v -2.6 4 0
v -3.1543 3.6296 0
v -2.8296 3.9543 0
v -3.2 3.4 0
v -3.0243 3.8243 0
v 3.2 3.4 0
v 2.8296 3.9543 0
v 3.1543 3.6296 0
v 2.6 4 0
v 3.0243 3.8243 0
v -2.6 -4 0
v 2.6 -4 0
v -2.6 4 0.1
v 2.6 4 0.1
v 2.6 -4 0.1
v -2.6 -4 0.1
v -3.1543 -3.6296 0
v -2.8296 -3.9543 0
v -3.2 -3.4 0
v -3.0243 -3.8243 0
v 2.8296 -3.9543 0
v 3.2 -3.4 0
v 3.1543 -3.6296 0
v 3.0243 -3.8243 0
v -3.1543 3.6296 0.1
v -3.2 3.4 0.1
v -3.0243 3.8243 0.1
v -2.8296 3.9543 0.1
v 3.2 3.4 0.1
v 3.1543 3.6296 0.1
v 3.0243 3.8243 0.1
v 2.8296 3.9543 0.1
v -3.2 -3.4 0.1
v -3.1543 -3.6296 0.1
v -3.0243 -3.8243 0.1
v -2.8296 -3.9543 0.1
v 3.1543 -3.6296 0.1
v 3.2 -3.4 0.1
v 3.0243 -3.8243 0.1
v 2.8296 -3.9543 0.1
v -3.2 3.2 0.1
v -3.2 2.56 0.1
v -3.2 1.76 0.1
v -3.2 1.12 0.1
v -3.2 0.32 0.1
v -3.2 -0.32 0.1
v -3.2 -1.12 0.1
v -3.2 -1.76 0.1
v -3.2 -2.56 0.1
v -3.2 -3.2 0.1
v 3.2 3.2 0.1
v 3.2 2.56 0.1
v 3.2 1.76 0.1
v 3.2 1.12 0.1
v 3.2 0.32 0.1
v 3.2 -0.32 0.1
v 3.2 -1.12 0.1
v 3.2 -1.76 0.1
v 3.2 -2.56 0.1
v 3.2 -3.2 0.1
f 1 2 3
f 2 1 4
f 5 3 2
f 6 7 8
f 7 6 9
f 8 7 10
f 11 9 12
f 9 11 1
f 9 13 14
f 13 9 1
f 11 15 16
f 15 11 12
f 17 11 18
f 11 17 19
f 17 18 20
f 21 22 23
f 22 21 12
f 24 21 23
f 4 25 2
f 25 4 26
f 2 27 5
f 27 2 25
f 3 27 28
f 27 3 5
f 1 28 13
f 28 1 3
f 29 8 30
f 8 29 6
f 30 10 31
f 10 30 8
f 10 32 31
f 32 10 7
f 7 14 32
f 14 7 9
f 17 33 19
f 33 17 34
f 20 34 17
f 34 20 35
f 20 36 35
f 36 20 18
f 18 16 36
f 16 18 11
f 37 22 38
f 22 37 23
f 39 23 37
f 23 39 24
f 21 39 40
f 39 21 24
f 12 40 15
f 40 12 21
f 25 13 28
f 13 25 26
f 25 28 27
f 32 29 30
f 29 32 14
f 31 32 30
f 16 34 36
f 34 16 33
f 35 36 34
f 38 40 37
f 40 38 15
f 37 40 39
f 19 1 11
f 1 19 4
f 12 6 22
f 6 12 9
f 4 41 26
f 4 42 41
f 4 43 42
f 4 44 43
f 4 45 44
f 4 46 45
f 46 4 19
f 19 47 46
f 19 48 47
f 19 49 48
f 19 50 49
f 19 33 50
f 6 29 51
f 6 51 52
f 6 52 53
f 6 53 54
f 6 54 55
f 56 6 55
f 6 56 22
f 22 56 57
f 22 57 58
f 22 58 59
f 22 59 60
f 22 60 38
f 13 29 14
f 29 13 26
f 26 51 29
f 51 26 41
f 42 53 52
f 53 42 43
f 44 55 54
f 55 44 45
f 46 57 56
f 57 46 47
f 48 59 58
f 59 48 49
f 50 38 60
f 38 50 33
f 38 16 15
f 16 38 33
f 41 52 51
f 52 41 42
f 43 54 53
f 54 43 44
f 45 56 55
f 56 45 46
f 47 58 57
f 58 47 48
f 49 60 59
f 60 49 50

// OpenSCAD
// file: ../p/box3u12.scad
use <../lib.scad>
function ldraw_lib__box3u12() = [
// 0 Box with 3 Parallel Faces without Any Edges
// 0 Name: box3u12.dat
// 0 Author: J.C. Tchang [tchang]
// 0 !LDRAW_ORG Primitive UPDATE 2014-02
// 0 !LICENSE Licensed under CC BY 4.0 : see CAreadme.txt
// 
// 0 BFC CERTIFY CCW
  [0,"BFC","CERTIFY"],
  [0,"BFC","CCW"],
// 
// 0 !HISTORY 2014-12-23 [PTadmin] Official Update 2014-02
// 
// 
// 4 16 -1 1 1 1 1 1 1 1 -1 -1 1 -1
  [4,16,-1,1,1,1,1,1,1,1,-1,-1,1,-1],
// 4 16 -1 1 1 -1 0 1 1 0 1 1 1 1
  [4,16,-1,1,1,-1,0,1,1,0,1,1,1,1],
// 4 16 1 1 -1 1 0 -1 -1 0 -1 -1 1 -1
  [4,16,1,1,-1,1,0,-1,-1,0,-1,-1,1,-1],
];
module ldraw_lib__box3u12(step=0, col=false, unit=2/5, alt=false, line=0.2, solid=!$preview)
    makepoly(ldraw_lib__box3u12(), step=step, col=col, unit=unit, alt=alt, line=line, solid=solid);
ldraw_lib__box3u12(line=0.2);
// file: ../p/1-4cyli.scad
use <../lib.scad>
function ldraw_lib__1_4cyli() = [
// 0 Cylinder 0.25
// 0 Name: 1-4cyli.dat
// 0 Author: James Jessiman
// 0 !LDRAW_ORG Primitive UPDATE 2012-01
// 0 !LICENSE Licensed under CC BY 4.0 : see CAreadme.txt
// 
// 0 BFC CERTIFY CCW
  [0,"BFC","CERTIFY"],
  [0,"BFC","CCW"],
// 
// 0 !HISTORY 2002-03-23 [sbliss] Added BFC statement.
// 0 !HISTORY 2002-04-25 [PTadmin] Official Update 2002-02
// 0 !HISTORY 2007-06-22 [PTadmin] Header formatted for Contributor Agreement
// 0 !HISTORY 2008-07-01 [PTadmin] Official Update 2008-01
// 0 !HISTORY 2012-02-16 [Philo] Changed to CCW
// 0 !HISTORY 2012-03-30 [PTadmin] Official Update 2012-01
// 
// 
// 4 16 1 1 0 0.9239 1 0.3827 0.9239 0 0.3827 1 0 0
  [4,16,1,1,0,0.9239,1,0.3827,0.9239,0,0.3827,1,0,0],
// 5 24 1 0 0 1 1 0 0.9239 0 0.3827 1 0 -1
  [5,24,1,0,0,1,1,0,0.9239,0,0.3827,1,0,-1],
// 4 16 0.9239 1 0.3827 0.7071 1 0.7071 0.7071 0 0.7071 0.9239 0 0.3827
  [4,16,0.9239,1,0.3827,0.7071,1,0.7071,0.7071,0,0.7071,0.9239,0,0.3827],
// 5 24 0.9239 0 0.3827 0.9239 1 0.3827 0.7071 0 0.7071 1 0 0
  [5,24,0.9239,0,0.3827,0.9239,1,0.3827,0.7071,0,0.7071,1,0,0],
// 4 16 0.7071 1 0.7071 0.3827 1 0.9239 0.3827 0 0.9239 0.7071 0 0.7071
  [4,16,0.7071,1,0.7071,0.3827,1,0.9239,0.3827,0,0.9239,0.7071,0,0.7071],
// 5 24 0.7071 0 0.7071 0.7071 1 0.7071 0.3827 0 0.9239 0.9239 0 0.3827
  [5,24,0.7071,0,0.7071,0.7071,1,0.7071,0.3827,0,0.9239,0.9239,0,0.3827],
// 4 16 0.3827 1 0.9239 0 1 1 0 0 1 0.3827 0 0.9239
  [4,16,0.3827,1,0.9239,0,1,1,0,0,1,0.3827,0,0.9239],
// 5 24 0.3827 0 0.9239 0.3827 1 0.9239 0 0 1 0.7071 0 0.7071
  [5,24,0.3827,0,0.9239,0.3827,1,0.9239,0,0,1,0.7071,0,0.7071],
// 5 24 0 0 1 0 1 1 0.3827 0 0.9239 -1 0 1
  [5,24,0,0,1,0,1,1,0.3827,0,0.9239,-1,0,1],
];
module ldraw_lib__1_4cyli(step=0, col=false, unit=2/5, alt=false, line=0.2, solid=!$preview)
    makepoly(ldraw_lib__1_4cyli(), step=step, col=col, unit=unit, alt=alt, line=line, solid=solid);
ldraw_lib__1_4cyli(line=0.2);
// file: ../p/1-4chrd.scad
use <../lib.scad>
function ldraw_lib__1_4chrd() = [
// 0 Chord 0.25
// 0 Name: 1-4chrd.dat
// 0 Author: Max Martin Richter [MMR1988]
// 0 !LDRAW_ORG Primitive UPDATE 2023-05
// 0 !LICENSE Licensed under CC BY 4.0 : see CAreadme.txt
// 
// 0 BFC CERTIFY CCW
  [0,"BFC","CERTIFY"],
  [0,"BFC","CCW"],
// 
// 0 !HISTORY 2004-04-22 [PTadmin] Official Update 2004-02
// 0 !HISTORY 2007-10-09 [PTadmin] Header formatted for Contributor Agreement
// 0 !HISTORY 2008-07-01 [PTadmin] Official Update 2008-01
// 0 !HISTORY 2012-08-02 [MMR1988] Re-creation with PrimGen2 and Rectifier
// 0 !HISTORY 2012-08-09 [PTadmin] Official Update 2012-02
// 0 !HISTORY 2023-10-27 [OrionP] Change author to MMR1988 from hafhead
// 0 !HISTORY 2023-10-31 [OrionP] Official Update 2023-05
// 
// 4 16 0.9239 0 0.3827 0.3827 0 0.9239 0 0 1 1 0 0
  [4,16,0.9239,0,0.3827,0.3827,0,0.9239,0,0,1,1,0,0],
// 3 16 0.7071 0 0.7071 0.3827 0 0.9239 0.9239 0 0.3827
  [3,16,0.7071,0,0.7071,0.3827,0,0.9239,0.9239,0,0.3827],
];
module ldraw_lib__1_4chrd(step=0, col=false, unit=2/5, alt=false, line=0.2, solid=!$preview)
    makepoly(ldraw_lib__1_4chrd(), step=step, col=col, unit=unit, alt=alt, line=line, solid=solid);
ldraw_lib__1_4chrd(line=0.2);
// main file
use <../lib.scad>
use <../p/1-4chrd.scad>
use <../p/1-4cyli.scad>
use <../p/box3u12.scad>
function ldraw_lib__6148328bl() = [
// 0 Sticker  1.0 x  0.8 with Dark Grey Stripes on Black Background
// 0 Name: 6148328bl.dat
// 0 Author: Massimo Maso [Sirio]
// 0 !LDRAW_ORG Part UPDATE 2024-08
// 0 !LICENSE Licensed under CC BY 4.0 : see CAreadme.txt
// 
// 0 BFC CERTIFY CCW
  [0,"BFC","CERTIFY"],
  [0,"BFC","CCW"],
// 
// 0 !KEYWORDS 919, Bricklink 75876stk01, Brickowl 852010, Hybrid, Pit Lane
// 0 !KEYWORDS Porsche, Rebrickable 26357, set 75876, Speed Champions
// 
// 0 !HISTORY 2024-09-30 [OrionP] Official Update 2024-08
// 
// 
// 0 // Primitives
// 
// 1 16 -6.5 0 8.5 -1.5 0 0 0 -1 0 0 0 1.5 1-4chrd.dat
  [1,16,-6.5,0,8.5,-1.5,0,0,0,-1,0,0,0,1.5, ldraw_lib__1_4chrd()],
// 1 16 6.5 0 8.5 1.5 0 0 0 -1 0 0 0 1.5 1-4chrd.dat
  [1,16,6.5,0,8.5,1.5,0,0,0,-1,0,0,0,1.5, ldraw_lib__1_4chrd()],
// 1 16 0 -.25 0 6.5 0 0 0 .25 0 0 0 10 box3u12.dat
  [1,16,0,-.25,0,6.5,0,0,0,.25,0,0,0,10, ldraw_lib__box3u12()],
// 1 16 -6.5 0 -8.5 -1.5 0 0 0 -1 0 0 0 -1.5 1-4chrd.dat
  [1,16,-6.5,0,-8.5,-1.5,0,0,0,-1,0,0,0,-1.5, ldraw_lib__1_4chrd()],
// 1 16 6.5 0 -8.5 1.5 0 0 0 -1 0 0 0 -1.5 1-4chrd.dat
  [1,16,6.5,0,-8.5,1.5,0,0,0,-1,0,0,0,-1.5, ldraw_lib__1_4chrd()],
// 1 16 -6.5 0 8.5 -1.5 0 0 0 -.25 0 0 0 1.5 1-4cyli.dat
  [1,16,-6.5,0,8.5,-1.5,0,0,0,-.25,0,0,0,1.5, ldraw_lib__1_4cyli()],
// 1 16 6.5 0 8.5 1.5 0 0 0 -.25 0 0 0 1.5 1-4cyli.dat
  [1,16,6.5,0,8.5,1.5,0,0,0,-.25,0,0,0,1.5, ldraw_lib__1_4cyli()],
// 1 16 -6.5 0 -8.5 -1.5 0 0 0 -.25 0 0 0 -1.5 1-4cyli.dat
  [1,16,-6.5,0,-8.5,-1.5,0,0,0,-.25,0,0,0,-1.5, ldraw_lib__1_4cyli()],
// 1 16 6.5 0 -8.5 1.5 0 0 0 -.25 0 0 0 -1.5 1-4cyli.dat
  [1,16,6.5,0,-8.5,1.5,0,0,0,-.25,0,0,0,-1.5, ldraw_lib__1_4cyli()],
// 1 0 -6.5 -.25 8.5 -1.5 0 0 0 1 0 0 0 1.5 1-4chrd.dat
  [1,0,-6.5,-.25,8.5,-1.5,0,0,0,1,0,0,0,1.5, ldraw_lib__1_4chrd()],
// 1 0 6.5 -.25 8.5 1.5 0 0 0 1 0 0 0 1.5 1-4chrd.dat
  [1,0,6.5,-.25,8.5,1.5,0,0,0,1,0,0,0,1.5, ldraw_lib__1_4chrd()],
// 1 0 -6.5 -.25 -8.5 -1.5 0 0 0 1 0 0 0 -1.5 1-4chrd.dat
  [1,0,-6.5,-.25,-8.5,-1.5,0,0,0,1,0,0,0,-1.5, ldraw_lib__1_4chrd()],
// 1 0 6.5 -.25 -8.5 1.5 0 0 0 1 0 0 0 -1.5 1-4chrd.dat
  [1,0,6.5,-.25,-8.5,1.5,0,0,0,1,0,0,0,-1.5, ldraw_lib__1_4chrd()],
// 0 // Bottom faces
// 4 16 -6.5 0 10 -6.5 0 -10 -8 0 -8.5 -8 0 8.5
  [4,16,-6.5,0,10,-6.5,0,-10,-8,0,-8.5,-8,0,8.5],
// 4 16 6.5 0 10 8 0 8.5 8 0 -8.5 6.5 0 -10
  [4,16,6.5,0,10,8,0,8.5,8,0,-8.5,6.5,0,-10],
// 0 // Lateral faces
// 3 16 -8 0 8.5 -8 -.25 8 -8 -.25 8.5
  [3,16,-8,0,8.5,-8,-.25,8,-8,-.25,8.5],
// 3 16 -8 0 8.5 -8 -.25 6.4 -8 -.25 8
  [3,16,-8,0,8.5,-8,-.25,6.4,-8,-.25,8],
// 3 16 -8 0 8.5 -8 -.25 4.4 -8 -.25 6.4
  [3,16,-8,0,8.5,-8,-.25,4.4,-8,-.25,6.4],
// 3 16 -8 0 8.5 -8 -.25 2.8 -8 -.25 4.4
  [3,16,-8,0,8.5,-8,-.25,2.8,-8,-.25,4.4],
// 3 16 -8 0 8.5 -8 -.25 .8 -8 -.25 2.8
  [3,16,-8,0,8.5,-8,-.25,.8,-8,-.25,2.8],
// 4 16 -8 0 8.5 -8 0 -8.5 -8 -.25 -.8 -8 -.25 .8
  [4,16,-8,0,8.5,-8,0,-8.5,-8,-.25,-.8,-8,-.25,.8],
// 3 16 -8 0 -8.5 -8 -.25 -2.8 -8 -.25 -.8
  [3,16,-8,0,-8.5,-8,-.25,-2.8,-8,-.25,-.8],
// 3 16 -8 0 -8.5 -8 -.25 -4.4 -8 -.25 -2.8
  [3,16,-8,0,-8.5,-8,-.25,-4.4,-8,-.25,-2.8],
// 3 16 -8 0 -8.5 -8 -.25 -6.4 -8 -.25 -4.4
  [3,16,-8,0,-8.5,-8,-.25,-6.4,-8,-.25,-4.4],
// 3 16 -8 0 -8.5 -8 -.25 -8 -8 -.25 -6.4
  [3,16,-8,0,-8.5,-8,-.25,-8,-8,-.25,-6.4],
// 3 16 -8 0 -8.5 -8 -.25 -8.5 -8 -.25 -8
  [3,16,-8,0,-8.5,-8,-.25,-8.5,-8,-.25,-8],
// 3 16 8 0 8.5 8 -.25 8.5 8 -.25 8
  [3,16,8,0,8.5,8,-.25,8.5,8,-.25,8],
// 3 16 8 0 8.5 8 -.25 8 8 -.25 6.4
  [3,16,8,0,8.5,8,-.25,8,8,-.25,6.4],
// 3 16 8 0 8.5 8 -.25 6.4 8 -.25 4.4
  [3,16,8,0,8.5,8,-.25,6.4,8,-.25,4.4],
// 3 16 8 0 8.5 8 -.25 4.4 8 -.25 2.8
  [3,16,8,0,8.5,8,-.25,4.4,8,-.25,2.8],
// 3 16 8 0 8.5 8 -.25 2.8 8 -.25 .8
  [3,16,8,0,8.5,8,-.25,2.8,8,-.25,.8],
// 4 16 8 0 -8.5 8 0 8.5 8 -.25 .8 8 -.25 -.8
  [4,16,8,0,-8.5,8,0,8.5,8,-.25,.8,8,-.25,-.8],
// 3 16 8 0 -8.5 8 -.25 -.8 8 -.25 -2.8
  [3,16,8,0,-8.5,8,-.25,-.8,8,-.25,-2.8],
// 3 16 8 0 -8.5 8 -.25 -2.8 8 -.25 -4.4
  [3,16,8,0,-8.5,8,-.25,-2.8,8,-.25,-4.4],
// 3 16 8 0 -8.5 8 -.25 -4.4 8 -.25 -6.4
  [3,16,8,0,-8.5,8,-.25,-4.4,8,-.25,-6.4],
// 3 16 8 0 -8.5 8 -.25 -6.4 8 -.25 -8
  [3,16,8,0,-8.5,8,-.25,-6.4,8,-.25,-8],
// 3 16 8 0 -8.5 8 -.25 -8 8 -.25 -8.5
  [3,16,8,0,-8.5,8,-.25,-8,8,-.25,-8.5],
// 0 // Top faces
// 0 // Black faces
// 4 0 -6.5 -.25 10 -8 -.25 8.5 8 -.25 8.5 6.5 -.25 10
  [4,0,-6.5,-.25,10,-8,-.25,8.5,8,-.25,8.5,6.5,-.25,10],
// 4 0 -8 -.25 8.5 -8 -.25 8 8 -.25 8 8 -.25 8.5
  [4,0,-8,-.25,8.5,-8,-.25,8,8,-.25,8,8,-.25,8.5],
// 4 0 -8 -.25 6.4 -8 -.25 4.4 8 -.25 4.4 8 -.25 6.4
  [4,0,-8,-.25,6.4,-8,-.25,4.4,8,-.25,4.4,8,-.25,6.4],
// 4 0 -8 -.25 2.8 -8 -.25 .8 8 -.25 .8 8 -.25 2.8
  [4,0,-8,-.25,2.8,-8,-.25,.8,8,-.25,.8,8,-.25,2.8],
// 4 0 -8 -.25 -.8 -8 -.25 -2.8 8 -.25 -2.8 8 -.25 -.8
  [4,0,-8,-.25,-.8,-8,-.25,-2.8,8,-.25,-2.8,8,-.25,-.8],
// 4 0 -8 -.25 -4.4 -8 -.25 -6.4 8 -.25 -6.4 8 -.25 -4.4
  [4,0,-8,-.25,-4.4,-8,-.25,-6.4,8,-.25,-6.4,8,-.25,-4.4],
// 4 0 -8 -.25 -8 -8 -.25 -8.5 8 -.25 -8.5 8 -.25 -8
  [4,0,-8,-.25,-8,-8,-.25,-8.5,8,-.25,-8.5,8,-.25,-8],
// 4 0 -8 -.25 -8.5 -6.5 -.25 -10 6.5 -.25 -10 8 -.25 -8.5
  [4,0,-8,-.25,-8.5,-6.5,-.25,-10,6.5,-.25,-10,8,-.25,-8.5],
// 0 // Dark grey stripes
// 4 72 -8 -.25 8 -8 -.25 6.4 8 -.25 6.4 8 -.25 8
  [4,72,-8,-.25,8,-8,-.25,6.4,8,-.25,6.4,8,-.25,8],
// 4 72 -8 -.25 4.4 -8 -.25 2.8 8 -.25 2.8 8 -.25 4.4
  [4,72,-8,-.25,4.4,-8,-.25,2.8,8,-.25,2.8,8,-.25,4.4],
// 4 72 -8 -.25 .8 -8 -.25 -.8 8 -.25 -.8 8 -.25 .8
  [4,72,-8,-.25,.8,-8,-.25,-.8,8,-.25,-.8,8,-.25,.8],
// 4 72 -8 -.25 -2.8 -8 -.25 -4.4 8 -.25 -4.4 8 -.25 -2.8
  [4,72,-8,-.25,-2.8,-8,-.25,-4.4,8,-.25,-4.4,8,-.25,-2.8],
// 4 72 -8 -.25 -6.4 -8 -.25 -8 8 -.25 -8 8 -.25 -6.4
  [4,72,-8,-.25,-6.4,-8,-.25,-8,8,-.25,-8,8,-.25,-6.4],
];
module ldraw_lib__6148328bl(step=0, col=false, unit=2/5, alt=false, line=0.2, solid=!$preview)
    makepoly(ldraw_lib__6148328bl(), step=step, col=col, unit=unit, alt=alt, line=line, solid=solid);
ldraw_lib__6148328bl(line=0.2);
